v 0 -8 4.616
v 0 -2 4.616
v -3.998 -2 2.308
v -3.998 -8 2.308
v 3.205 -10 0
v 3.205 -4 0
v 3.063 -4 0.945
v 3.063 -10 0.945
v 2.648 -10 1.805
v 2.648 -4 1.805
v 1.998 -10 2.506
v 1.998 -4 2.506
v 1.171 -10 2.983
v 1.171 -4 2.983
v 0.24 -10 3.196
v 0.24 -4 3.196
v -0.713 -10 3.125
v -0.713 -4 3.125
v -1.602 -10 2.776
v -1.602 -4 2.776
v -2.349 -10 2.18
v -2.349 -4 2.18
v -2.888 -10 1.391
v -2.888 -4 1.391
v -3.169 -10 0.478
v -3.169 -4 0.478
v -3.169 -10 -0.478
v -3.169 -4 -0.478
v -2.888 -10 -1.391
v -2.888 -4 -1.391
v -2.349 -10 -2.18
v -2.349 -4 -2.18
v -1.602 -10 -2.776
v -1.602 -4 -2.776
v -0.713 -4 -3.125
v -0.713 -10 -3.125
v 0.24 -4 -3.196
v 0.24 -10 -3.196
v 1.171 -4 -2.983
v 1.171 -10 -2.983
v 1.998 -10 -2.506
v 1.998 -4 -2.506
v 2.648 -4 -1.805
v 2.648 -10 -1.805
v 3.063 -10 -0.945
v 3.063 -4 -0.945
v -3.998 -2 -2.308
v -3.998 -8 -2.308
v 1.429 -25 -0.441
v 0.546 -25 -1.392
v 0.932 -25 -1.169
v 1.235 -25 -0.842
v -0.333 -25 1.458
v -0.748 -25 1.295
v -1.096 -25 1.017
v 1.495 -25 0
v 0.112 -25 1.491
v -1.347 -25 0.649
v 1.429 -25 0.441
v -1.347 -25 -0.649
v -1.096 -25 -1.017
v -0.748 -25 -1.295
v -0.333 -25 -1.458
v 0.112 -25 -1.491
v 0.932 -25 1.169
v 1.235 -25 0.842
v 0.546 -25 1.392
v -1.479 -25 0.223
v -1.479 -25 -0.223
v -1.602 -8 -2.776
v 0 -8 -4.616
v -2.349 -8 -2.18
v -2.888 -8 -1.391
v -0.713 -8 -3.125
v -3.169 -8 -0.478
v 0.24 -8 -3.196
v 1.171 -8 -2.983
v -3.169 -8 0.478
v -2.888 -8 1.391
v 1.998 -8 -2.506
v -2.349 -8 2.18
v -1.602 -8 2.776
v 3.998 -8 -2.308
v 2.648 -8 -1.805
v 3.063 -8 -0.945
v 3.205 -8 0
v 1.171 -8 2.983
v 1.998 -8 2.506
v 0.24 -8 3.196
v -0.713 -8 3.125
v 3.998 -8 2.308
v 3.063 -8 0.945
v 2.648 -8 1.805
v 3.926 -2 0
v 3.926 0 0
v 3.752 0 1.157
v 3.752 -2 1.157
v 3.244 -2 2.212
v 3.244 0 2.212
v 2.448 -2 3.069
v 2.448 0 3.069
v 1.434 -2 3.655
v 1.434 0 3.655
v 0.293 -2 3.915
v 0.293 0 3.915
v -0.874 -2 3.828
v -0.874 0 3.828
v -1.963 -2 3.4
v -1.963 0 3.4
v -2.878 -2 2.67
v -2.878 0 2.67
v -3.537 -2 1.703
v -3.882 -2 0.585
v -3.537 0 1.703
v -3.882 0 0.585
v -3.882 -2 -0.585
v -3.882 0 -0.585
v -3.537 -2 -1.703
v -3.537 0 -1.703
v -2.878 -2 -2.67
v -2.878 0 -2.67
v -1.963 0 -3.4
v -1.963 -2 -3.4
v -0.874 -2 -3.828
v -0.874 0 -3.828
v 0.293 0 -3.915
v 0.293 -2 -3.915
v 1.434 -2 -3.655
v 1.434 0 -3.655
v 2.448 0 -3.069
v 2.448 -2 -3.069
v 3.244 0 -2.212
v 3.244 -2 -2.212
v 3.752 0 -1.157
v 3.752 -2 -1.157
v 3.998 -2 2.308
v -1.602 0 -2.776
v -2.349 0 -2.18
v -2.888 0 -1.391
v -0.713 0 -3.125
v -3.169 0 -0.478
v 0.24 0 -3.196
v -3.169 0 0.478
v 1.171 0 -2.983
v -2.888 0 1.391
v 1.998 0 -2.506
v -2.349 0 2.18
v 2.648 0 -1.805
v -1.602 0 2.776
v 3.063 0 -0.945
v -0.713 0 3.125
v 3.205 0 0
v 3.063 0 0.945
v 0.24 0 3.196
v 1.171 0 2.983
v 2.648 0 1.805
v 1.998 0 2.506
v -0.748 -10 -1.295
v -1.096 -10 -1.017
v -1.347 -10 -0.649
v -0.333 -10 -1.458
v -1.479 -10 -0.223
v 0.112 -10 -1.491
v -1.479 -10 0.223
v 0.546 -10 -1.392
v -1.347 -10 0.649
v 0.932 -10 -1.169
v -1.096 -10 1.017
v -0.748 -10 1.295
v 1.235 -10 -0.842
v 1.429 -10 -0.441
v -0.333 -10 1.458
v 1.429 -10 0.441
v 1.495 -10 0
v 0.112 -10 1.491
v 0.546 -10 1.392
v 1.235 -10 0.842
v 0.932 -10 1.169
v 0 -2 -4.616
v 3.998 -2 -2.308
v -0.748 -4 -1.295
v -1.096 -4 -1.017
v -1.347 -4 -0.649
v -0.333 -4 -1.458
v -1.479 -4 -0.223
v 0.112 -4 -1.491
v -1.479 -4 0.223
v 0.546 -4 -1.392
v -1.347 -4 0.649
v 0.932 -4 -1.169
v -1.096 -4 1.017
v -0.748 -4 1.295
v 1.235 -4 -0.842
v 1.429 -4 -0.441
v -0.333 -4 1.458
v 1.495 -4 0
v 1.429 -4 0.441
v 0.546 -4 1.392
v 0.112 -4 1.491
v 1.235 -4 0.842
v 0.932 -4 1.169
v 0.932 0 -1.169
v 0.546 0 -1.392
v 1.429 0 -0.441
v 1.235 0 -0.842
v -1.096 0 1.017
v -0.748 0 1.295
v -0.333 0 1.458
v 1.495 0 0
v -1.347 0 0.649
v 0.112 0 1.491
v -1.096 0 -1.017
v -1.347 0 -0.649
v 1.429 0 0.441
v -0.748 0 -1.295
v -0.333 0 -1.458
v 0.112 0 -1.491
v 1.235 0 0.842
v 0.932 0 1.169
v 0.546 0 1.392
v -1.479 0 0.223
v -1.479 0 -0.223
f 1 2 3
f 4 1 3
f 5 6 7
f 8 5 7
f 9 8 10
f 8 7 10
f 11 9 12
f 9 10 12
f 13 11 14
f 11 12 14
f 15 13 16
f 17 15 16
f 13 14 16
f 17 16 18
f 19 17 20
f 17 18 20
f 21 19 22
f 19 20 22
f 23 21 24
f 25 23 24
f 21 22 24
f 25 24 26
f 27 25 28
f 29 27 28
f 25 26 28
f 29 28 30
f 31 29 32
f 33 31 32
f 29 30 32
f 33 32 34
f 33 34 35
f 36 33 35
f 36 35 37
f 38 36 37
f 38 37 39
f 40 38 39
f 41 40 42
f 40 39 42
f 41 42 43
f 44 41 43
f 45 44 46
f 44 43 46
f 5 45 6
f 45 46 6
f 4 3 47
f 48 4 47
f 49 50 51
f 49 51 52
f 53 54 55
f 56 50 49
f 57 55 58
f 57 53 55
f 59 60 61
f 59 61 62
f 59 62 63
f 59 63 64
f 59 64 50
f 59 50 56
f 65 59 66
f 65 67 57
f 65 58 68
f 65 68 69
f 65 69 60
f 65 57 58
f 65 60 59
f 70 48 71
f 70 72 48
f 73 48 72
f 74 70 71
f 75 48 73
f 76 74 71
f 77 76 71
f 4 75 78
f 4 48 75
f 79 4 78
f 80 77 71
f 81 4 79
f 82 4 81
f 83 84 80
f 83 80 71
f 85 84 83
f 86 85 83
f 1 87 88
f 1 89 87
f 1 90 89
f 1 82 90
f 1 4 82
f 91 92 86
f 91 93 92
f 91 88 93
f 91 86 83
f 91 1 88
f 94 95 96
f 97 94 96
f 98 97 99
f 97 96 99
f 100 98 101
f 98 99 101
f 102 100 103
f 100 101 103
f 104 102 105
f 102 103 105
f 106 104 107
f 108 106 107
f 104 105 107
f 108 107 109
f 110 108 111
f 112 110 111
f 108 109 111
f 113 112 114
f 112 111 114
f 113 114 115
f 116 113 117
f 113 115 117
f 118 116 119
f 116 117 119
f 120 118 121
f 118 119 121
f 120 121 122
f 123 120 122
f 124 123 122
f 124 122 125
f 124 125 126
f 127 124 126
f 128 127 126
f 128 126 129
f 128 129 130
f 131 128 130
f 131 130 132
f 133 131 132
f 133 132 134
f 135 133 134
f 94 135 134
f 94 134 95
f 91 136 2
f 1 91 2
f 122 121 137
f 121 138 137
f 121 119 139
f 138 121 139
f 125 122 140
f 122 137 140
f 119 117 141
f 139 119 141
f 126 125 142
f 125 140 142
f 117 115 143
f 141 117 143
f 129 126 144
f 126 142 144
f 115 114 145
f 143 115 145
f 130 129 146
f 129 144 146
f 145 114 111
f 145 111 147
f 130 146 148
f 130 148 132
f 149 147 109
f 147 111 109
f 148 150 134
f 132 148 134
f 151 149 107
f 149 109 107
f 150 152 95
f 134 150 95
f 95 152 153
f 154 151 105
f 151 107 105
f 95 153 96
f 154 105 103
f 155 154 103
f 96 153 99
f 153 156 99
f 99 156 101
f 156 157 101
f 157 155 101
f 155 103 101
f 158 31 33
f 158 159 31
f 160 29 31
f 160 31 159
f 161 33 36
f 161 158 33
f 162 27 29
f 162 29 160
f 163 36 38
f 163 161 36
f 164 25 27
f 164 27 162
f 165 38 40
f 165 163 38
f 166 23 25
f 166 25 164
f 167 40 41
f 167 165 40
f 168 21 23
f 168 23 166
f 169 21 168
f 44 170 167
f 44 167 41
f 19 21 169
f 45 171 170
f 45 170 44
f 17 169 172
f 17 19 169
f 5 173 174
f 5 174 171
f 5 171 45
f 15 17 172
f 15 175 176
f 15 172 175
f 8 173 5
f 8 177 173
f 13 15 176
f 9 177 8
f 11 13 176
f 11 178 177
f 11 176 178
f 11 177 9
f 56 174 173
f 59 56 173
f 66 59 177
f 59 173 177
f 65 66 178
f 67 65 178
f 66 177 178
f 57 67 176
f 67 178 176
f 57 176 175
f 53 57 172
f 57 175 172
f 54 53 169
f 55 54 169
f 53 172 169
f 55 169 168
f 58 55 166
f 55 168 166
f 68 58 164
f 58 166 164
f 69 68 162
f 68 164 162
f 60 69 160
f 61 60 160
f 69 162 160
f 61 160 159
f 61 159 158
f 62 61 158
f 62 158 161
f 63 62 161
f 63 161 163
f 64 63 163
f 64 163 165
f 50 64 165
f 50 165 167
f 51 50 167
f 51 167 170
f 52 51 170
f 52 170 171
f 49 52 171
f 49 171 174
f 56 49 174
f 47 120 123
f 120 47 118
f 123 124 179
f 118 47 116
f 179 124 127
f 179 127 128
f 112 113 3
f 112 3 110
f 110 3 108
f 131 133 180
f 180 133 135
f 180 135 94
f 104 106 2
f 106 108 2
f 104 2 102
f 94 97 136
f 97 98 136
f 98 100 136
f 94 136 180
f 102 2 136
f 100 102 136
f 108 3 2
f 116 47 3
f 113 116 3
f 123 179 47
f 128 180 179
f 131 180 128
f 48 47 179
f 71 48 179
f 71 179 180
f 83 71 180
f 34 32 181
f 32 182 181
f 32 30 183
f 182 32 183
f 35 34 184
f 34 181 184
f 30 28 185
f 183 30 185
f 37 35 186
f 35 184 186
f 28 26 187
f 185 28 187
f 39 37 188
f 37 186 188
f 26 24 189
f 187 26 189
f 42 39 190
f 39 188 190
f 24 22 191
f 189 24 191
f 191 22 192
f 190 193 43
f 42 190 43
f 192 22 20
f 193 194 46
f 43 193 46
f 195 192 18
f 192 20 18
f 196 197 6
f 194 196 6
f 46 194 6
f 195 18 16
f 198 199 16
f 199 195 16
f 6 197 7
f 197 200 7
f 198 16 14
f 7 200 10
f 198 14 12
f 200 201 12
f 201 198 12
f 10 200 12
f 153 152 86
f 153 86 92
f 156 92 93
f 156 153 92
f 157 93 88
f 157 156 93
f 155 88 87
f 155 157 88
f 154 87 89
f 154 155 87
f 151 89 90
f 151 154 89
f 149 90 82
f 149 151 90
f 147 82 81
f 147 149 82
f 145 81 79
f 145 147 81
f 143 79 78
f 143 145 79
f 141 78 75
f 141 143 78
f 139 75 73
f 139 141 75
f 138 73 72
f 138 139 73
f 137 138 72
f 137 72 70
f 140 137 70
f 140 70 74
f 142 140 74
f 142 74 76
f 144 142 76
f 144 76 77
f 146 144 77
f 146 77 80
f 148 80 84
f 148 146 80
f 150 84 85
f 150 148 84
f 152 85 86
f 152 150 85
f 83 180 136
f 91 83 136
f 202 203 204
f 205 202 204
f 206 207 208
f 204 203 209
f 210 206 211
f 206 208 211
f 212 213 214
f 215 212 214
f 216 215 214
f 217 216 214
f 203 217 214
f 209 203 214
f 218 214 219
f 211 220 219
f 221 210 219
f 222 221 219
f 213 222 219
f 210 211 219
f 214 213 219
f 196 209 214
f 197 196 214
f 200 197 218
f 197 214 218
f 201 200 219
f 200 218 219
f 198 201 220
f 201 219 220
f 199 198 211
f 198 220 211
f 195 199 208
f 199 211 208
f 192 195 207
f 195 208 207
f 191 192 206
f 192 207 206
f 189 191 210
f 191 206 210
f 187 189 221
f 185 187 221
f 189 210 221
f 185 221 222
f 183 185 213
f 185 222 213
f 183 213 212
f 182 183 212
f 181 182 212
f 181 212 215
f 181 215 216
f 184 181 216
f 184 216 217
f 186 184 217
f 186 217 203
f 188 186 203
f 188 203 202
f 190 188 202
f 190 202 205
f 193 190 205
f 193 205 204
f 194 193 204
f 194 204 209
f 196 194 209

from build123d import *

# Parameters (mm, degrees)
F0_R     = 1.495231247
F1_DEPTH = 25
F2_START = 2
F0_R_2   = 3.9260289208
F2_DEPTH = 6
F3_START = 4
F0_R_3   = 3.2049719045
F3_DEPTH = 6
F4_DEPTH = 8


with BuildPart() as f1:
    # F0 (on Front) → F1 (new body)
    with BuildSketch(Plane.XZ):
        Circle(F0_R)
    extrude(amount=F1_DEPTH)

    # F0 (on Front) → F3 (join)
    with BuildSketch(Plane.XZ.offset(F3_START)):
        Circle(F0_R_3)
        Circle(F0_R, mode=Mode.SUBTRACT)
    extrude(amount=F3_DEPTH)


with BuildPart() as f2:
    # F0 (on Front) → F2 (new body)
    with BuildSketch(Plane.XZ.offset(F2_START)):
        Polygon((3.997805994, -2.3081343668), (3.997805994, 2.3081343668), (0, 4.6162687336), (-3.997805994, 2.3081343668), (-3.997805994, -2.3081343668), (0, -4.6162687336), align=None)
        Circle(F0_R_2, mode=Mode.SUBTRACT)
    extrude(amount=F2_DEPTH)

    # F0 (on Front) → F4 (join)
    with BuildSketch(Plane.XZ):
        Circle(F0_R_2)
        Circle(F0_R_3, mode=Mode.SUBTRACT)
    extrude(amount=F4_DEPTH)


solid = Compound([f1.part, f2.part])
